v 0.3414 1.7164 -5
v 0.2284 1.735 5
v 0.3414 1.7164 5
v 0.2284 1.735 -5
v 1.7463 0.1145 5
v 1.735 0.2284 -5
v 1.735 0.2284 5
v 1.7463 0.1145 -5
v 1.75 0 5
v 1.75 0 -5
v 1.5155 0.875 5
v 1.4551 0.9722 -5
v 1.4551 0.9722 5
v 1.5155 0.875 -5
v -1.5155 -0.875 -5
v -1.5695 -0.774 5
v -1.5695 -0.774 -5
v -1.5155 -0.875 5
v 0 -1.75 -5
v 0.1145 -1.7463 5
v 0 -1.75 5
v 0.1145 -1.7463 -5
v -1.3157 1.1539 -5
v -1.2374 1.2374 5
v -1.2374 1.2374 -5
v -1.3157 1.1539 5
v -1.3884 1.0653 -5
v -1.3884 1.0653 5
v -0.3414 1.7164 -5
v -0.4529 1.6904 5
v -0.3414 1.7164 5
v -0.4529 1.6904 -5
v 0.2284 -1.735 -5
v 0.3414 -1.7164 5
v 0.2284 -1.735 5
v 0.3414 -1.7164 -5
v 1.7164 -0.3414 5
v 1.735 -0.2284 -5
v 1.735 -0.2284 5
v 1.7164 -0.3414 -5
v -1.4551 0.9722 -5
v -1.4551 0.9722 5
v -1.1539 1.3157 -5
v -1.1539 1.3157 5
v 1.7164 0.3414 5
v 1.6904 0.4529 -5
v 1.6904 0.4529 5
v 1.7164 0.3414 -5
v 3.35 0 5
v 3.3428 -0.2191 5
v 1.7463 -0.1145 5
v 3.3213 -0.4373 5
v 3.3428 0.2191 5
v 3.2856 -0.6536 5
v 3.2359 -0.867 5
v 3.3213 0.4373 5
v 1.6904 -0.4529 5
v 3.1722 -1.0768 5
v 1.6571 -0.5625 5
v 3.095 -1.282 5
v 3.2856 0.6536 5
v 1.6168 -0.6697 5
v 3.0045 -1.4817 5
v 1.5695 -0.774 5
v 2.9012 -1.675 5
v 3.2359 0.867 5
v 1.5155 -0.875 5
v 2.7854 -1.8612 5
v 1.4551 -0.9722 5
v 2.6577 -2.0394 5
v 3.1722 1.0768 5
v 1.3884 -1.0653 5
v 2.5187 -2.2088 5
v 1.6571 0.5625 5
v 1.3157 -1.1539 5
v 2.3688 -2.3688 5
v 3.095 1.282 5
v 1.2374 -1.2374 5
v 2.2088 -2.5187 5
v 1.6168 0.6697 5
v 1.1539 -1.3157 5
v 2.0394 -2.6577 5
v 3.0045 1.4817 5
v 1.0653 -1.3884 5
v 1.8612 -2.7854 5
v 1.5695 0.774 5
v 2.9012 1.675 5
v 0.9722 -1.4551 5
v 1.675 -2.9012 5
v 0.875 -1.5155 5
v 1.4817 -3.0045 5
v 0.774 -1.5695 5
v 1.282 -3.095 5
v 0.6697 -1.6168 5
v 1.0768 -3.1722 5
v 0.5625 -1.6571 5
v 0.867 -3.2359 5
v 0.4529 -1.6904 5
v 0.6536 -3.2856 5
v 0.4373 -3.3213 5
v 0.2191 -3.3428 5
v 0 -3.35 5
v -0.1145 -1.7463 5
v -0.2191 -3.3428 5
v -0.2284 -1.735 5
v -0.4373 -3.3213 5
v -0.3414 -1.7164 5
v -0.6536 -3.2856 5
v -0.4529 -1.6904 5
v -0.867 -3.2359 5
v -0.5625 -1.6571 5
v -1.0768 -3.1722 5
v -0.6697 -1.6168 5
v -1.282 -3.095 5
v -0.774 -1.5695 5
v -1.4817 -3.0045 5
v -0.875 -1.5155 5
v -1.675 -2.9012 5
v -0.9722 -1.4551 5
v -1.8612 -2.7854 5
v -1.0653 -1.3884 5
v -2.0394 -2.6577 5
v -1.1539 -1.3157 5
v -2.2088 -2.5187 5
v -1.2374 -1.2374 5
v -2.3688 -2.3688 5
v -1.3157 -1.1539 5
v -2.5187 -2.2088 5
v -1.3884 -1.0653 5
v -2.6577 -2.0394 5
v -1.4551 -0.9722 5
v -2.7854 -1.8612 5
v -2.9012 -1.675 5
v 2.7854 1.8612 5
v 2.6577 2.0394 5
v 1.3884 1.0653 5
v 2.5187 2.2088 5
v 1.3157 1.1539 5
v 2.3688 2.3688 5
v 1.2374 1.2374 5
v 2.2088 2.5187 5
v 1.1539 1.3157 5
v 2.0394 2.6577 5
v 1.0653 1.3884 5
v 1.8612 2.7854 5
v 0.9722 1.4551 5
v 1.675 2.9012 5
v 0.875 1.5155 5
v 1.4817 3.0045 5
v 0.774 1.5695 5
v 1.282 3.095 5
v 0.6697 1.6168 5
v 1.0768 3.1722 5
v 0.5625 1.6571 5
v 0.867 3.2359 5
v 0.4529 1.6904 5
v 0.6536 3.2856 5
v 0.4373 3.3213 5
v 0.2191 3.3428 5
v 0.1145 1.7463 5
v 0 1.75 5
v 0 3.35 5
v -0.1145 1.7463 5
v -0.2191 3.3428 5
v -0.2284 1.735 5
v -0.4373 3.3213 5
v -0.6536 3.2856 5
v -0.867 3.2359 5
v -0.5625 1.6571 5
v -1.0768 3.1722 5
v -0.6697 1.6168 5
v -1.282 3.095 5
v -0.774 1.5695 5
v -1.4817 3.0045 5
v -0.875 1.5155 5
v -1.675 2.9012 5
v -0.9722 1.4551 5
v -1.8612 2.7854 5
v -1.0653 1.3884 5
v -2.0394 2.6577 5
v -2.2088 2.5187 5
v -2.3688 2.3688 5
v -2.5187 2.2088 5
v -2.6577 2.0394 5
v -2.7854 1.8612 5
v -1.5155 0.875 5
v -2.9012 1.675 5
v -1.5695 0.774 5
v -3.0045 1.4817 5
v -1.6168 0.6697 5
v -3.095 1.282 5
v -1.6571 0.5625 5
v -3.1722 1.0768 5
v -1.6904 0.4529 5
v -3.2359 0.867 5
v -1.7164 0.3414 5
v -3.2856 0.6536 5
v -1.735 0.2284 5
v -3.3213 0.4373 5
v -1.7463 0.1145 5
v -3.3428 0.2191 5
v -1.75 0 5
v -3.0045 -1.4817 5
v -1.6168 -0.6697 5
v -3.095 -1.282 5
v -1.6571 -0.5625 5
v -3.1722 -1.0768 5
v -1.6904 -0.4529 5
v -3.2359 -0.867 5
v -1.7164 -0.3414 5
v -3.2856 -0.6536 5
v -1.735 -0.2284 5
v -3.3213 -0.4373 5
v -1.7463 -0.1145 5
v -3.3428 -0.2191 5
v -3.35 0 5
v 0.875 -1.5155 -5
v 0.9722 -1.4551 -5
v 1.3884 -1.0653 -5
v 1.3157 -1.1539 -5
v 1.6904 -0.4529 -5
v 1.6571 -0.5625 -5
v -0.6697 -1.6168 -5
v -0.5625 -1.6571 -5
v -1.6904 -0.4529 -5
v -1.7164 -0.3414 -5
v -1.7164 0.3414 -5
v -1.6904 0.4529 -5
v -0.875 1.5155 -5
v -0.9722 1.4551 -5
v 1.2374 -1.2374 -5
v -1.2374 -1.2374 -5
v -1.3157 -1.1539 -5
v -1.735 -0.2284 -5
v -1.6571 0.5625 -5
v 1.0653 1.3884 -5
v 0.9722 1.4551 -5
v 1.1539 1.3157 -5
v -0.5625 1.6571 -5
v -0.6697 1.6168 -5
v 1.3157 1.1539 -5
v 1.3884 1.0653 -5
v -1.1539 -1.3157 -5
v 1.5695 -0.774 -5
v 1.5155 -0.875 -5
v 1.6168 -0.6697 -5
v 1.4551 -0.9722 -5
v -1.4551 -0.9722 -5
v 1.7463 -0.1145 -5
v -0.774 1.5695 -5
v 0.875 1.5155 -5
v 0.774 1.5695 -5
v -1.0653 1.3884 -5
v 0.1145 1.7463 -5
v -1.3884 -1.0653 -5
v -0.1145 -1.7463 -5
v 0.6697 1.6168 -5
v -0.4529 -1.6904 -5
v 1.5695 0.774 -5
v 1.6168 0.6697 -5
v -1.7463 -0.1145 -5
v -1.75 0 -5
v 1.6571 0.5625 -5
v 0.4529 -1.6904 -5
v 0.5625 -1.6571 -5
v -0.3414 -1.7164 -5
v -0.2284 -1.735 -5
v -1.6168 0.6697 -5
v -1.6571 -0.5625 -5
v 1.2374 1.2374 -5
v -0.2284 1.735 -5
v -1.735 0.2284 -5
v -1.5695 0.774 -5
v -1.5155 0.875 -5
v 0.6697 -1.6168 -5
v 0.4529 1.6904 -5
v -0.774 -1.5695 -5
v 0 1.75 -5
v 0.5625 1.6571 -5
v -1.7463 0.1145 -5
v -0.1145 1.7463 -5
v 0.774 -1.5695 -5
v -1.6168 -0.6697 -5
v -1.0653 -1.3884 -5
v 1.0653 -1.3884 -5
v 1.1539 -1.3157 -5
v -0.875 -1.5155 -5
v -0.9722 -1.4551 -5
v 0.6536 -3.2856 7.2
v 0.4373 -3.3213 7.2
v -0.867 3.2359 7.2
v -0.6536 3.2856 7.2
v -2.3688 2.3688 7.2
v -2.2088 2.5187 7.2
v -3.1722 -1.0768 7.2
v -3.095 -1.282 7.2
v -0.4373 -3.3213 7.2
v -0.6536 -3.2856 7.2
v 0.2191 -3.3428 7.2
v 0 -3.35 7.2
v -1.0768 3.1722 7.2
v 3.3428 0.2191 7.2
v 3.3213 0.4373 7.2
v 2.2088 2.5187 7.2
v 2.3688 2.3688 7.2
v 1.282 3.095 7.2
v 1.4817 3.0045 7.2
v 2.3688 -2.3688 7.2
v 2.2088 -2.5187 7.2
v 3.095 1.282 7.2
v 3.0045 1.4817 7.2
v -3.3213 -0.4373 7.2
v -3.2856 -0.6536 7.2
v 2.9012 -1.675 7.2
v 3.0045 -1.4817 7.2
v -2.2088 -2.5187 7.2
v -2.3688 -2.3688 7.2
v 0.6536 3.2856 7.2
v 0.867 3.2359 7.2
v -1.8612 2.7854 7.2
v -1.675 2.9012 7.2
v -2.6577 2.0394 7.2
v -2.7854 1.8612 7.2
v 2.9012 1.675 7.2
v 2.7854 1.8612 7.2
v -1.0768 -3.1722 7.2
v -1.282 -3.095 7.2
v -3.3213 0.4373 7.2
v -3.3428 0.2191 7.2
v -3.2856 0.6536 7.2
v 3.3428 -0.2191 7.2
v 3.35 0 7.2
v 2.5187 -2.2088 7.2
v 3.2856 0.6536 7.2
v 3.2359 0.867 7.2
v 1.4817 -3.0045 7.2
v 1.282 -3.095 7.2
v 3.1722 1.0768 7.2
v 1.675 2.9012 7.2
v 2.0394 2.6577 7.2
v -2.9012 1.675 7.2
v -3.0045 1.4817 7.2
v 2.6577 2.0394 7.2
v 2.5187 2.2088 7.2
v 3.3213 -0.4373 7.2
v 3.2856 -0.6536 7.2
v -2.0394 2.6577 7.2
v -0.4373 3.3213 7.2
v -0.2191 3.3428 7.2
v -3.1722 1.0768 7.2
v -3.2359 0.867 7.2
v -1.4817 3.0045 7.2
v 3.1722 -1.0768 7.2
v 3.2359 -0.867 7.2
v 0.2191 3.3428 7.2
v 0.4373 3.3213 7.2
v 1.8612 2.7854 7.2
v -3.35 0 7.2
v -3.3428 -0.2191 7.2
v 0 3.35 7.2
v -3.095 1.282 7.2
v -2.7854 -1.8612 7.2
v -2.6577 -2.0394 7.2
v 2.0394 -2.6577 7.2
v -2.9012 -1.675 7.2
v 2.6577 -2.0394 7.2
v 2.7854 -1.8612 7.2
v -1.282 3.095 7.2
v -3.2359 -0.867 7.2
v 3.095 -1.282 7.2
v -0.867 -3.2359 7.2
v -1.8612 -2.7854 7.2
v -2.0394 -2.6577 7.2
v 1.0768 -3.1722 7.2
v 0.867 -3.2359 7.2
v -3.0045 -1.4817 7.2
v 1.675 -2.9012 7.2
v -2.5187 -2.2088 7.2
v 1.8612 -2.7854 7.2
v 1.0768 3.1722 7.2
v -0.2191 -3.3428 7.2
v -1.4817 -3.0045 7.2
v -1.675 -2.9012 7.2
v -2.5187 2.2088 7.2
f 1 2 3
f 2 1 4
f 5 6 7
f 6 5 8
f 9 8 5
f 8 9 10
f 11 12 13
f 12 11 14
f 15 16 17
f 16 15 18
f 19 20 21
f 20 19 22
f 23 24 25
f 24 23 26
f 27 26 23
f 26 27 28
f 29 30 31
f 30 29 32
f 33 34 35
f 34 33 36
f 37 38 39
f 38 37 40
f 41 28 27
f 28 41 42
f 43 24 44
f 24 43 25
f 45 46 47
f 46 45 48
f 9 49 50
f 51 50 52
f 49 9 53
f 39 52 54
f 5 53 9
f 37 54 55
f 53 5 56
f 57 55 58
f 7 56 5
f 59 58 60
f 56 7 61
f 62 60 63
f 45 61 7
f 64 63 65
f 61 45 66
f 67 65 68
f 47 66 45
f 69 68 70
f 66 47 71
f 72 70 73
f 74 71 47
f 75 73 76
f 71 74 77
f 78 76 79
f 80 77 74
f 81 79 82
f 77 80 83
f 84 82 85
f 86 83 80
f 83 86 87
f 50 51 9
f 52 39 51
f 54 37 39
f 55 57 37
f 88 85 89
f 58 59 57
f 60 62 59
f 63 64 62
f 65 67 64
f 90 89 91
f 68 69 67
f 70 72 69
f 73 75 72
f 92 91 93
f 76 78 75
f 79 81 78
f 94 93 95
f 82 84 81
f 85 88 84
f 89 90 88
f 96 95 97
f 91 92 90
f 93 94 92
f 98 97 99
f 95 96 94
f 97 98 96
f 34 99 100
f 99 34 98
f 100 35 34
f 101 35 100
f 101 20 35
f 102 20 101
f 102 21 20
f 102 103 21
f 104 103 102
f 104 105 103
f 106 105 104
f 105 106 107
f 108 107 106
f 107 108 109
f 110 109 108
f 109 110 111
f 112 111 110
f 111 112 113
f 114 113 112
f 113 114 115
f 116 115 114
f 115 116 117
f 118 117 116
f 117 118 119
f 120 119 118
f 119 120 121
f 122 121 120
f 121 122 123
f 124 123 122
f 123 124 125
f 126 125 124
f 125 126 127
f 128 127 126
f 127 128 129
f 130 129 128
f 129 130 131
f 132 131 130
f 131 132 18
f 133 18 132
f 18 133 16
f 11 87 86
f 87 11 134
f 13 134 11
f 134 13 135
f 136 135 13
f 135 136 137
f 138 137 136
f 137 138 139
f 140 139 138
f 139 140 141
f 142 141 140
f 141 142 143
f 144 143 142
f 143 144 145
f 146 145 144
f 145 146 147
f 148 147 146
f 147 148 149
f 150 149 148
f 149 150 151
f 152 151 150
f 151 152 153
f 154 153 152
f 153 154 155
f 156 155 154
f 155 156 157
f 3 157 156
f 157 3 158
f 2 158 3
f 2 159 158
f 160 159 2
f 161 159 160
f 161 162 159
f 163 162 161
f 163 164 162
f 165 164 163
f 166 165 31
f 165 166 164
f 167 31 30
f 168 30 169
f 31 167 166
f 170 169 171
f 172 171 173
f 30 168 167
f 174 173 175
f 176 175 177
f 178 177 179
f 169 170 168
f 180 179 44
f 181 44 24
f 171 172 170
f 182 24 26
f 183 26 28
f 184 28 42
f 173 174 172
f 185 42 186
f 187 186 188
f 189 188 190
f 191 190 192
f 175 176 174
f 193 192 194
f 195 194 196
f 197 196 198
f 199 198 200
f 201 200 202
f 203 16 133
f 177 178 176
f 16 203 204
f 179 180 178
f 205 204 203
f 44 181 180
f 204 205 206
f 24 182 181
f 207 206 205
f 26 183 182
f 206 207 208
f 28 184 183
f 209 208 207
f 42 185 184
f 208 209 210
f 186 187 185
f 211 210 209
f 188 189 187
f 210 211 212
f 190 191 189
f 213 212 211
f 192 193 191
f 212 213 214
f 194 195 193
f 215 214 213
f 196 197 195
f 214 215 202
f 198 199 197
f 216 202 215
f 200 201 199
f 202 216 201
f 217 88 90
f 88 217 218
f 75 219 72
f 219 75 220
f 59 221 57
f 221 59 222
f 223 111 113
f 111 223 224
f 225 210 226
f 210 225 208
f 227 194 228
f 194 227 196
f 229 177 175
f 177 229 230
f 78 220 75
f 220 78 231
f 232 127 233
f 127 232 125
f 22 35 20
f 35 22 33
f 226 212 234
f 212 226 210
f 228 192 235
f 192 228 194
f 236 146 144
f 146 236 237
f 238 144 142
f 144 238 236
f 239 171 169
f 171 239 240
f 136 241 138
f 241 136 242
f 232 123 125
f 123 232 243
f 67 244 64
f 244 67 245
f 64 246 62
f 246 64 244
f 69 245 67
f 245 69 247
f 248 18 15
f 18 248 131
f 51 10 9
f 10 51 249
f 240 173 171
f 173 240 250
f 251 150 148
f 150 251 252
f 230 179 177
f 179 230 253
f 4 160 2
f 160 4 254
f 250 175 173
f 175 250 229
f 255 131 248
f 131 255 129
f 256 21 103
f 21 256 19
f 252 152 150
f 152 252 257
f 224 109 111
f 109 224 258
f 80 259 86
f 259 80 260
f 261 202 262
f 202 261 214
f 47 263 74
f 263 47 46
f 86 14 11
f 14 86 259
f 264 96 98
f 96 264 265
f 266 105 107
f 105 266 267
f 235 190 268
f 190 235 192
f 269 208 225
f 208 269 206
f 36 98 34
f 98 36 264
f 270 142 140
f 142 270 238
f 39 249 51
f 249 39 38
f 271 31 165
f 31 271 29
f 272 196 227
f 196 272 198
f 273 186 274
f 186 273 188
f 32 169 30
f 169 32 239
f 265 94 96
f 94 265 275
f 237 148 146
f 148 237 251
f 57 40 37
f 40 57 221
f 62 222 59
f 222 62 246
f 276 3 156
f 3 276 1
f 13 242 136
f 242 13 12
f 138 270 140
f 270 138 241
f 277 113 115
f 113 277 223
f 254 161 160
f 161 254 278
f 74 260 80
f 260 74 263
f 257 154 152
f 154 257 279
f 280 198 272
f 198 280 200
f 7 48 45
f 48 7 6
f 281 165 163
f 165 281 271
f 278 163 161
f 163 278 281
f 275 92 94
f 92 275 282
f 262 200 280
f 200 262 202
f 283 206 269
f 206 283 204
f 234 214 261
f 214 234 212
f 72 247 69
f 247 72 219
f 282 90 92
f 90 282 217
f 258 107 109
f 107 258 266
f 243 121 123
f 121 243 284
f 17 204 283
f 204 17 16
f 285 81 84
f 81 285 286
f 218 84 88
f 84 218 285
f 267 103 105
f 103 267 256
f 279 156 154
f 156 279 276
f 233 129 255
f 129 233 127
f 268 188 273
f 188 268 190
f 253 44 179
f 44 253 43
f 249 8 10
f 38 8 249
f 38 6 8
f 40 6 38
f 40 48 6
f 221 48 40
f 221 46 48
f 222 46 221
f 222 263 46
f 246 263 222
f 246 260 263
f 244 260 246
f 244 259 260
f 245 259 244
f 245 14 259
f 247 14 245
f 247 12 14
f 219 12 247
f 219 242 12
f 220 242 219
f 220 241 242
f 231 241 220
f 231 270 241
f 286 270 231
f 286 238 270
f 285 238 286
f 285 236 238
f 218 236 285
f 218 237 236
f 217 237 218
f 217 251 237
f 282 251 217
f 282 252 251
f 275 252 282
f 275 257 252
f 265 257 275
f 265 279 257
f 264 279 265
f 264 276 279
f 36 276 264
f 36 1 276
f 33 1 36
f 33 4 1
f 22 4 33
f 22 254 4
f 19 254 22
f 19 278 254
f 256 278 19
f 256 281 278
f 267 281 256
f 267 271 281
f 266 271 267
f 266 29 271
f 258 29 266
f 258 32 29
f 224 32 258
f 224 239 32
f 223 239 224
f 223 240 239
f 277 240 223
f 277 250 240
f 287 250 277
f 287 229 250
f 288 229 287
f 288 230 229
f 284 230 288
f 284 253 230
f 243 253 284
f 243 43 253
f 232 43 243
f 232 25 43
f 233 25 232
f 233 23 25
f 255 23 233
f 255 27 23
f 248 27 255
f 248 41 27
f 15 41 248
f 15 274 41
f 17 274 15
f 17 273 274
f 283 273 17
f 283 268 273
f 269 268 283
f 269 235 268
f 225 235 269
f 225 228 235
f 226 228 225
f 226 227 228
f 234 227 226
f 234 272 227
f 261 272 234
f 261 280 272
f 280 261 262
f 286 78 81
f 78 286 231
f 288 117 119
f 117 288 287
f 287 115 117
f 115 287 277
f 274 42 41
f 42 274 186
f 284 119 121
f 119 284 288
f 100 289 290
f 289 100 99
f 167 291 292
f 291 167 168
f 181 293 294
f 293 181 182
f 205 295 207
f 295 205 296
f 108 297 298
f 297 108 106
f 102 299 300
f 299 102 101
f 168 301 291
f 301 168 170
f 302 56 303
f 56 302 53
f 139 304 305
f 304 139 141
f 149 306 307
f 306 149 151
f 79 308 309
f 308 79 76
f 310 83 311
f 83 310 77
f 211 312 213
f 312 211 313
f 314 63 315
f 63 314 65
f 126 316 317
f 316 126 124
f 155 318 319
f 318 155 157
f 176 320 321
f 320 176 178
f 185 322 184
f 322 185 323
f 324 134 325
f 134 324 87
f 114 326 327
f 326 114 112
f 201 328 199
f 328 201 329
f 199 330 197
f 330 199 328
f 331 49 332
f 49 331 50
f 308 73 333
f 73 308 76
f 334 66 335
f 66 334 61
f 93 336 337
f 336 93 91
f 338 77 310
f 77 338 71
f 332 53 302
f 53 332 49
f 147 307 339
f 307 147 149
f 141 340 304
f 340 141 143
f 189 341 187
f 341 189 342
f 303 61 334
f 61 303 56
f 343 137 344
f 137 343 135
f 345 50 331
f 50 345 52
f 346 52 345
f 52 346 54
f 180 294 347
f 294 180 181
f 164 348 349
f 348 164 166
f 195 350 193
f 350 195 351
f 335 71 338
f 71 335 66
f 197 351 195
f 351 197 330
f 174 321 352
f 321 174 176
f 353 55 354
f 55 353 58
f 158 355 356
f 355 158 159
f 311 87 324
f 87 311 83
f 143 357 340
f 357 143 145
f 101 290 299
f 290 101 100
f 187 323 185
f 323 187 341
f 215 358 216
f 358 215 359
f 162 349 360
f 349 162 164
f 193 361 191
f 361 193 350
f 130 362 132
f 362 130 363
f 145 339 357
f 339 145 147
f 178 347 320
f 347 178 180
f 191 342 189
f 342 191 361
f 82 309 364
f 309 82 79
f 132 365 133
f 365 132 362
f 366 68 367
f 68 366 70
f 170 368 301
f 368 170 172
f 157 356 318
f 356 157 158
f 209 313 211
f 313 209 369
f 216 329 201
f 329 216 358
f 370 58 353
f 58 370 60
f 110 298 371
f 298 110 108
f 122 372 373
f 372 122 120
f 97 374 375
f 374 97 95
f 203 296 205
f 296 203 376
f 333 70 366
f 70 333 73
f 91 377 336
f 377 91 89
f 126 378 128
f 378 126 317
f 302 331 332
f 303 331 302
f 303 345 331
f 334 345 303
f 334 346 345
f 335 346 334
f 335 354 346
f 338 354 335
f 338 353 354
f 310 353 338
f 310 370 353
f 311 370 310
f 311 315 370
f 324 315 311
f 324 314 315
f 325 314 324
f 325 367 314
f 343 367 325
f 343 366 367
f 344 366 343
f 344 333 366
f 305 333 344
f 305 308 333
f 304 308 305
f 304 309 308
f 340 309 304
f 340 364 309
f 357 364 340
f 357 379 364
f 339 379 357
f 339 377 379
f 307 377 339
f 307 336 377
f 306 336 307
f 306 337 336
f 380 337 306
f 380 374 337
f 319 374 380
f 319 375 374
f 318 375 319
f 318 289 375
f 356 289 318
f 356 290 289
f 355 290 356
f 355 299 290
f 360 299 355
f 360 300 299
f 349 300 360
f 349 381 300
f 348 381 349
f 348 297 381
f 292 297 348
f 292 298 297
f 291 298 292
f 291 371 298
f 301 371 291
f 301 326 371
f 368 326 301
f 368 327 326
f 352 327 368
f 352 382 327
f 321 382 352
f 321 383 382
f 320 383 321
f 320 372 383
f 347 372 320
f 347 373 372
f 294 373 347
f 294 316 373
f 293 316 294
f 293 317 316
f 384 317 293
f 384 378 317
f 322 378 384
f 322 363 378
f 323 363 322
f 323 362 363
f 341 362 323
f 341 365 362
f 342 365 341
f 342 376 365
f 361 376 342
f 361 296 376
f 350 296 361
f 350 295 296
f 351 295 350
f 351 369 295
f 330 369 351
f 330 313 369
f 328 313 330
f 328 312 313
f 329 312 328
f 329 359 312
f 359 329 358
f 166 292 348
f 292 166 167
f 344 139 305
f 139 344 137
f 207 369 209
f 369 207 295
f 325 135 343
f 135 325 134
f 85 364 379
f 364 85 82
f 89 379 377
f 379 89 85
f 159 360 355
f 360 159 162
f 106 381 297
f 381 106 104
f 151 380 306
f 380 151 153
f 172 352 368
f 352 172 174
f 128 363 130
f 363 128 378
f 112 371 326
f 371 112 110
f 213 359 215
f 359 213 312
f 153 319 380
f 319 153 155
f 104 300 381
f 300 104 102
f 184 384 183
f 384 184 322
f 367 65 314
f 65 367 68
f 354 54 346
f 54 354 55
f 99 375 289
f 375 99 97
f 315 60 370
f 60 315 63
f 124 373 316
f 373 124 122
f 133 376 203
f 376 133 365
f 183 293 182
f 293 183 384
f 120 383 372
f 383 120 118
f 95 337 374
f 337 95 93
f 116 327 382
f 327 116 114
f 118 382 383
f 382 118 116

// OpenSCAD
$fn=96;

module pan_head_screw(shaft_d=3.5, length=10, head_d=6.7, head_h=2.2) {
    union() {
        translate([0,0,-length/2])
            cylinder(d=shaft_d, h=length, $fn=96);

        translate([0,0,length/2])
            cylinder(d=head_d, h=head_h, $fn=96);
    }
}

pan_head_screw();
